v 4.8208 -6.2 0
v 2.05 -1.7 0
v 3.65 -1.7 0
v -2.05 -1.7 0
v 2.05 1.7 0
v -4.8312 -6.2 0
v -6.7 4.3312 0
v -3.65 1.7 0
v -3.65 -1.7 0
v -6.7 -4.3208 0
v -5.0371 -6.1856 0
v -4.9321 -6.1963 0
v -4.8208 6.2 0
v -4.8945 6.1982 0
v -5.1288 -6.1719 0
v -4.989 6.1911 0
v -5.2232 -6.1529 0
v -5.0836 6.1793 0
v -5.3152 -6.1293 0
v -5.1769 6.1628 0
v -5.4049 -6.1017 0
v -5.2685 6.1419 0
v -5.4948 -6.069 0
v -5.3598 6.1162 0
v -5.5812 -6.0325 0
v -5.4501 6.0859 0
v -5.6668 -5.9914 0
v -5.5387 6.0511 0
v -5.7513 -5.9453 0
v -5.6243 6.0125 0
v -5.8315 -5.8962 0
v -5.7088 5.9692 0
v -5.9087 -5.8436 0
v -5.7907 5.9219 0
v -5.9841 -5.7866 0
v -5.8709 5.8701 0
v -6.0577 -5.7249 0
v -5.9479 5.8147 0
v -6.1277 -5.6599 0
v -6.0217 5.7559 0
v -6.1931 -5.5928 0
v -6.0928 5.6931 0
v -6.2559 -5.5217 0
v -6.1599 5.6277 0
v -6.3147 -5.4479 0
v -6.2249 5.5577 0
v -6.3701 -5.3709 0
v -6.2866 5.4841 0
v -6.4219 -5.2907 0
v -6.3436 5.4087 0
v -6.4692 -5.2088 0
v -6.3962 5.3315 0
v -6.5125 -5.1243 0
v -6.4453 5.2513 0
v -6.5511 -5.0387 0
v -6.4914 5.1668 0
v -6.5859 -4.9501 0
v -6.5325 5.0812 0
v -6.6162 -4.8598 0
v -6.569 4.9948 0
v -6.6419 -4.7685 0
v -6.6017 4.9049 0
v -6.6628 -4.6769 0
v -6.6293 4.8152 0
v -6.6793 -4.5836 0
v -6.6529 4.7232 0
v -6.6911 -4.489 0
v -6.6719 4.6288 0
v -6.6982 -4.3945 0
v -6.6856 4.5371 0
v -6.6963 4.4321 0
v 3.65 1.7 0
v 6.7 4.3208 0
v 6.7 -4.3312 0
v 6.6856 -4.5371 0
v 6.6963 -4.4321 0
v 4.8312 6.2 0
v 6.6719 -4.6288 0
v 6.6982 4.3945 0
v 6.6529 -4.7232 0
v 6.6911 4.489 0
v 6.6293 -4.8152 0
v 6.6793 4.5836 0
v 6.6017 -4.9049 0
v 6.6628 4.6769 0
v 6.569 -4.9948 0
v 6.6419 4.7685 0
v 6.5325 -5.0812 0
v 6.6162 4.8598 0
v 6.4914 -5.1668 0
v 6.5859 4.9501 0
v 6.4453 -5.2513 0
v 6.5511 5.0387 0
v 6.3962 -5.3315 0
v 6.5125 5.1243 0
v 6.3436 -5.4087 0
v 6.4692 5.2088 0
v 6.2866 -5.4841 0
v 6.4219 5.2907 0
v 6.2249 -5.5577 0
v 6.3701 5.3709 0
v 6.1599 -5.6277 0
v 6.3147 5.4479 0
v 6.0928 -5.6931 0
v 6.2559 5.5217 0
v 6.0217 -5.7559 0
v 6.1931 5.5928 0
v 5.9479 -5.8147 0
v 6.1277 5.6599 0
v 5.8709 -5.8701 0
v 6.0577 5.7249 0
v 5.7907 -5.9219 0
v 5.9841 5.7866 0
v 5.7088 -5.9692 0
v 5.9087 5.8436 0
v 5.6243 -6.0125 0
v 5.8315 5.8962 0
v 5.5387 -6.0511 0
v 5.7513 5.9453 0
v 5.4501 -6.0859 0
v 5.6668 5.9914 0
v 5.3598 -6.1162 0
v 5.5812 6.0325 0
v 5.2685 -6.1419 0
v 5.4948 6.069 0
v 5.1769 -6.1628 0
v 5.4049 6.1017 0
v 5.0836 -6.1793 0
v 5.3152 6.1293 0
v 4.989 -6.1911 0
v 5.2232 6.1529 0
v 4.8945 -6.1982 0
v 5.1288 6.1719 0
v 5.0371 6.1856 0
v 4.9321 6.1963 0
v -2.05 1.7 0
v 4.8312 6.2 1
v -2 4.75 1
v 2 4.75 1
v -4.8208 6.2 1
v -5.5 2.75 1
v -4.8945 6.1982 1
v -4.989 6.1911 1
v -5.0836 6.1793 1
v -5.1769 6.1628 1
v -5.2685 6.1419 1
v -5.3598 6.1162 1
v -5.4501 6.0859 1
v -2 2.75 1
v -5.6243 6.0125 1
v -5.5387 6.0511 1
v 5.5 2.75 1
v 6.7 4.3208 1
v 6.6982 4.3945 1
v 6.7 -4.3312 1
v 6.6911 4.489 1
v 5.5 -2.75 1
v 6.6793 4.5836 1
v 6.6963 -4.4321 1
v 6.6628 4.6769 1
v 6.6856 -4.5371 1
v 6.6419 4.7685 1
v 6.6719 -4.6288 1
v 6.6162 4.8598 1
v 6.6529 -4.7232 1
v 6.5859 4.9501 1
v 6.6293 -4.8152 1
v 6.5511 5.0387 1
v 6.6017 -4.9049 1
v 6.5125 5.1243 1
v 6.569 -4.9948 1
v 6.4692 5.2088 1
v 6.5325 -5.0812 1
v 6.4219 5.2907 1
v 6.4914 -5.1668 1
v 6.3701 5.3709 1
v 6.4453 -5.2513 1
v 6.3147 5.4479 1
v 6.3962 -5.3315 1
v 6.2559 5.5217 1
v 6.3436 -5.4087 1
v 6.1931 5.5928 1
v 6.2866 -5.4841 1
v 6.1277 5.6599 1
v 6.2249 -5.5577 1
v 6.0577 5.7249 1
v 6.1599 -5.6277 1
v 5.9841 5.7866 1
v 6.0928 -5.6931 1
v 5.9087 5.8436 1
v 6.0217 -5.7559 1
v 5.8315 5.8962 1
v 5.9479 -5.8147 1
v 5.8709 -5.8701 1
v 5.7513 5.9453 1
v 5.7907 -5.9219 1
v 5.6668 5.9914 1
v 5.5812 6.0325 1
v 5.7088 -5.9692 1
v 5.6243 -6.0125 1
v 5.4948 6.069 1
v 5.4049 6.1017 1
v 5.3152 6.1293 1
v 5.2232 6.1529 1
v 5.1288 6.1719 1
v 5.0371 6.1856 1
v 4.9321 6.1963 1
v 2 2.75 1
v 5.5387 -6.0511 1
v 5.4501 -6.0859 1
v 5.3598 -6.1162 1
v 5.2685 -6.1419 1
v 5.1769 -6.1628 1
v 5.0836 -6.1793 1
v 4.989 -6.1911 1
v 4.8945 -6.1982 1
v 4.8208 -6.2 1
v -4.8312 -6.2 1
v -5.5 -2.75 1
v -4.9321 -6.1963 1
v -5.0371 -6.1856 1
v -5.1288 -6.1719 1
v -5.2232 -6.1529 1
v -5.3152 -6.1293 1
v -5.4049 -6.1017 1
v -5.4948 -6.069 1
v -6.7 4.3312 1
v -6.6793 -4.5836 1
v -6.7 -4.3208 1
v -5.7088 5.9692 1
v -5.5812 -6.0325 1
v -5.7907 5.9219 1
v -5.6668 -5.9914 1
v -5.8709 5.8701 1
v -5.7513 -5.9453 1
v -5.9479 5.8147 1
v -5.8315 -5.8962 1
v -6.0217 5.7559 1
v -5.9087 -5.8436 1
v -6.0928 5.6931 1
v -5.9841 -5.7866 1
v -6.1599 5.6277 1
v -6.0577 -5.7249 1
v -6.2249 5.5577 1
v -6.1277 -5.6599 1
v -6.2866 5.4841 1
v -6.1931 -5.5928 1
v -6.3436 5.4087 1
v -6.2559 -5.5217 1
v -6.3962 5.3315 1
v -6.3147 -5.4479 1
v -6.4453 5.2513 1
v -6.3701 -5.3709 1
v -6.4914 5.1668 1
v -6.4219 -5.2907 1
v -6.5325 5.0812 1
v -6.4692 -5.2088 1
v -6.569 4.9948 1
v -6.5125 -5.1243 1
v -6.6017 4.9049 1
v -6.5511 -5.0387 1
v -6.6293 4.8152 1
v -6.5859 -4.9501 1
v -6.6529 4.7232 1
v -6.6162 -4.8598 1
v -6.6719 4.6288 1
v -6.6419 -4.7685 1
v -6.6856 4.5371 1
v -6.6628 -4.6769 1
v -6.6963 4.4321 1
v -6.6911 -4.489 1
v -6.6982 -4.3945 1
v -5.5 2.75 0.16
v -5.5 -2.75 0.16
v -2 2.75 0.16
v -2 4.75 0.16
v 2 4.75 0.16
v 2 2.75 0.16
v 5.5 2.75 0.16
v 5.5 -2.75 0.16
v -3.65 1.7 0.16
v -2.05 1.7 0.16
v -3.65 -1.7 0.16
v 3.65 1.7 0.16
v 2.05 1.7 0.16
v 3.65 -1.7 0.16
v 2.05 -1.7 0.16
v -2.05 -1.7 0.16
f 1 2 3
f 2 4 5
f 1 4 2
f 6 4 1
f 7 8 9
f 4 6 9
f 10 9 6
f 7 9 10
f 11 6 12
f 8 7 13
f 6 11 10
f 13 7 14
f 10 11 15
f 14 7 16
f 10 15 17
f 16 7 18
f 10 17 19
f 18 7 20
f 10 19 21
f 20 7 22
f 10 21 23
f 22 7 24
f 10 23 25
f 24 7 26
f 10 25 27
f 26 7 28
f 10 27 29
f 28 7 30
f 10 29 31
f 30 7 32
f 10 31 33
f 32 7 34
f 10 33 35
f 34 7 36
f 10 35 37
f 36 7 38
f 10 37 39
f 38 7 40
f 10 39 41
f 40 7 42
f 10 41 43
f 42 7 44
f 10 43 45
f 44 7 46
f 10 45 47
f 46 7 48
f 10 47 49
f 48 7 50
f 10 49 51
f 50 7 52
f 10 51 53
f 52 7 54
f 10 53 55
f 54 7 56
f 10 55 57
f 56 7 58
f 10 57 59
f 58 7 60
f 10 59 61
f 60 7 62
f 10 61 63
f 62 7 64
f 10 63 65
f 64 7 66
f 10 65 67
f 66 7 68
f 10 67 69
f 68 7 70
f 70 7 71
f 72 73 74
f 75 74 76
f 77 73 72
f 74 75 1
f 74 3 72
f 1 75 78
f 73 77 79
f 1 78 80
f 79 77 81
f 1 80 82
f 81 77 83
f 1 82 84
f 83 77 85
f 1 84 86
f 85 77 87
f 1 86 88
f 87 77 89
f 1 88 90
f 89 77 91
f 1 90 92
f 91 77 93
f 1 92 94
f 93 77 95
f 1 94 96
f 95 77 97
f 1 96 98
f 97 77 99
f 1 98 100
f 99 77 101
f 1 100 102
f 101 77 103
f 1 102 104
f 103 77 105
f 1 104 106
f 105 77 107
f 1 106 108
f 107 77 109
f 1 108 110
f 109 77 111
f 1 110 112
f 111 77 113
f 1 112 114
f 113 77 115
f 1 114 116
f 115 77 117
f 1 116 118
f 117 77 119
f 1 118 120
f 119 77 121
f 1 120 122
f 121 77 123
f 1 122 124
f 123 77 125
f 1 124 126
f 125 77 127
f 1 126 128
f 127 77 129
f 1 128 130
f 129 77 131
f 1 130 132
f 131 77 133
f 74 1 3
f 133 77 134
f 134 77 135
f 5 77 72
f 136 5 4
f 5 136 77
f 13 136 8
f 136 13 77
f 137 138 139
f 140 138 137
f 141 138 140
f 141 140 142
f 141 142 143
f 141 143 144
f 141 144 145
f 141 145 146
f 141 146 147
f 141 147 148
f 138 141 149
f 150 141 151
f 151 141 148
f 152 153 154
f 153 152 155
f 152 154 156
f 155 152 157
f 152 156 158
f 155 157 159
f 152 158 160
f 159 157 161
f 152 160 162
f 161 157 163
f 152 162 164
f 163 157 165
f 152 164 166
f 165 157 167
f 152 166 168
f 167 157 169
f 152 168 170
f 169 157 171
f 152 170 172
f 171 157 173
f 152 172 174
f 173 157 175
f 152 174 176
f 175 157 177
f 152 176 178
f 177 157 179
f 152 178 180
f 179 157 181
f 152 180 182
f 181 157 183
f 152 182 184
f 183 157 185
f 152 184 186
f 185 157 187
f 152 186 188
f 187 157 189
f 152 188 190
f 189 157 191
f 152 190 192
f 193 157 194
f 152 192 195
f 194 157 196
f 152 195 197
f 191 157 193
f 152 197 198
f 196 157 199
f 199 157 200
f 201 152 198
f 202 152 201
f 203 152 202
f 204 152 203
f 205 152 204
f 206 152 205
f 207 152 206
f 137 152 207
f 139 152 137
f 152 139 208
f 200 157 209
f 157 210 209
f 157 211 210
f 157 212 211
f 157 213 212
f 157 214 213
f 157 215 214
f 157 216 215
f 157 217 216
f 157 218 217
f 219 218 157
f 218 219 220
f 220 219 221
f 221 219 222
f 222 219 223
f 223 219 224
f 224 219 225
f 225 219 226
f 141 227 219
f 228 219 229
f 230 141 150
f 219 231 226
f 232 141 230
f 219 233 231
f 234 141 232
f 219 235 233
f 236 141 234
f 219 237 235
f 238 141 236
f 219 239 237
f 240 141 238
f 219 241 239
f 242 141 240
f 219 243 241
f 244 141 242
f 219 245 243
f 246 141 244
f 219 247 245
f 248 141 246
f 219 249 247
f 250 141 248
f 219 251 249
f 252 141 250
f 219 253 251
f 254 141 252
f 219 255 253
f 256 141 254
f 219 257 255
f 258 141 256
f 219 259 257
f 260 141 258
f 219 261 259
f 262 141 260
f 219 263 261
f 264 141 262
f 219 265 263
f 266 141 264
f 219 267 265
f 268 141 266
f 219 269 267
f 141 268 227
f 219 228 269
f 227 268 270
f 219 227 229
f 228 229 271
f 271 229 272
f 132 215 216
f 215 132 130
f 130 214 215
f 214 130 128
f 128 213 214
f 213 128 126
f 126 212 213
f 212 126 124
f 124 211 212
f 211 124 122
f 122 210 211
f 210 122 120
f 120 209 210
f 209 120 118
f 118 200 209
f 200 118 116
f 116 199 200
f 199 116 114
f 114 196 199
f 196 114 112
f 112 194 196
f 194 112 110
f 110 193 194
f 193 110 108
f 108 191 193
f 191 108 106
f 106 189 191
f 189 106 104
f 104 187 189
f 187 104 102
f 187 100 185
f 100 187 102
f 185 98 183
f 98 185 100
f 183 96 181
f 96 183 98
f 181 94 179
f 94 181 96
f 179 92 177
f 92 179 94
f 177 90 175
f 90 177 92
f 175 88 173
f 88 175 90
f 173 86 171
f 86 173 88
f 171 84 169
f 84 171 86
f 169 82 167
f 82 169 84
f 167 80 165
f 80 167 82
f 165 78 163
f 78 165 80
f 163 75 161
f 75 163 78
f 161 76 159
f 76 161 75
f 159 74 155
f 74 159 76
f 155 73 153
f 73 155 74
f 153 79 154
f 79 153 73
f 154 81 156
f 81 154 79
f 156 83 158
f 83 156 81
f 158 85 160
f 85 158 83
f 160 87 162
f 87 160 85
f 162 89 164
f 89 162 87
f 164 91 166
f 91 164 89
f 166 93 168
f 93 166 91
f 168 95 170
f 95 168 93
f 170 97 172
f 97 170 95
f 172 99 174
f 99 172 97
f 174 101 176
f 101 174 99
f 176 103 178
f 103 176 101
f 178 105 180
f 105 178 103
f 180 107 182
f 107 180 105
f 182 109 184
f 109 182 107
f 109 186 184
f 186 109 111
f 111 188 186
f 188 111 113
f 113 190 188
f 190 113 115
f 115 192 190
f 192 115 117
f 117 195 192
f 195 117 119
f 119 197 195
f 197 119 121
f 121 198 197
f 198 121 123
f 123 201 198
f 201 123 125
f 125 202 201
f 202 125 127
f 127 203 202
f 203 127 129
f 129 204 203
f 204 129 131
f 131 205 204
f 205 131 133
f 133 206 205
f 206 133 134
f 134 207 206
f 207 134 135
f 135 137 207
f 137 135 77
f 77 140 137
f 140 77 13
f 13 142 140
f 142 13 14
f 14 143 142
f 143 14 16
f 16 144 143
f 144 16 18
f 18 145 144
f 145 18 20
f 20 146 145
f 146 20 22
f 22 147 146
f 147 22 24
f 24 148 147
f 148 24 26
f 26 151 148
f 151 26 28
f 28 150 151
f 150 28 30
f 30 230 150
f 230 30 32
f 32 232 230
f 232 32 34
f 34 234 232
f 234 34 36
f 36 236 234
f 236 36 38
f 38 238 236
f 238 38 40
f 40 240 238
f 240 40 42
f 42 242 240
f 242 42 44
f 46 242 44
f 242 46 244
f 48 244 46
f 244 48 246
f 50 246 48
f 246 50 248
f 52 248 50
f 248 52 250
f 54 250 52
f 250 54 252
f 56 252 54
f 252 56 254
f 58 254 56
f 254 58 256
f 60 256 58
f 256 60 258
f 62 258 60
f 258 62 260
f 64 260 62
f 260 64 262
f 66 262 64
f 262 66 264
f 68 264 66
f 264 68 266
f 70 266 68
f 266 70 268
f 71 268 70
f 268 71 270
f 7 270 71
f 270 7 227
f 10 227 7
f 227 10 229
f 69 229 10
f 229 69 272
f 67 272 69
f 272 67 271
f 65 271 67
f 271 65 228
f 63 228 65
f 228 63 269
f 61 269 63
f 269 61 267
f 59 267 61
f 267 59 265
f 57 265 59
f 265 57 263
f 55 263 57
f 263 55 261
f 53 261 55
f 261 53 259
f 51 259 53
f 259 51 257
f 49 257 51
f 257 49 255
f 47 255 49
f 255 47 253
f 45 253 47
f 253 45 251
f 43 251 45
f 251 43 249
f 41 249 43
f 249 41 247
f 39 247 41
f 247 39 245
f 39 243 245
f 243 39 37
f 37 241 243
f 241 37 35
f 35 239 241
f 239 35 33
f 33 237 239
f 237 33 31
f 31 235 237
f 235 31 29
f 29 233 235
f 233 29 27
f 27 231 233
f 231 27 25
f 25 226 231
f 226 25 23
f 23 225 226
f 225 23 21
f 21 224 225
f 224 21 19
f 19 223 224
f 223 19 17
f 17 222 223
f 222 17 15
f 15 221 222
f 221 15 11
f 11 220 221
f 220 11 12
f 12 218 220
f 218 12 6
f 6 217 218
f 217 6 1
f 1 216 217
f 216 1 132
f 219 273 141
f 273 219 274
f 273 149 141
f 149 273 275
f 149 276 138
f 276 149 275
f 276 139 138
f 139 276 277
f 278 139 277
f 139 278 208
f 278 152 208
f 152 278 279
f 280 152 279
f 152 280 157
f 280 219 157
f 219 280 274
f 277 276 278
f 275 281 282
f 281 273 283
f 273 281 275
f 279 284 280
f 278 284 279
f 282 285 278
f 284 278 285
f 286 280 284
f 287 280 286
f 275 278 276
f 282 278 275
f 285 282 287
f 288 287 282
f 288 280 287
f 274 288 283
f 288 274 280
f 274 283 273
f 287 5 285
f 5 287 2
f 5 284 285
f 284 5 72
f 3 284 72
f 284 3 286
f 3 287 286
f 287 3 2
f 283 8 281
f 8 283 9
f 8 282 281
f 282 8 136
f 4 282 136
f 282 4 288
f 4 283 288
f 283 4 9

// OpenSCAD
// Parameters

// Dynamic quality (0.12mm) should be used

interface_height = 0.16;

gasket_height = 1;
gasket_thickness = 1.7;

$fa = 0.01;
$fs = 0.01;

module rounding2d(r) {
    offset(r = r) offset(delta = -r) children(0);
}
 
linear_extrude(height = gasket_height) {
    difference() {
        offset(delta = gasket_thickness) {
            union() {
                rounding2d(0.2)
                    square([10,9], center = true);
            }
        }
        union() {
            square([11,5.5], center = true);
            translate([0,(5.5/2)+(2/2),0])
                square([4, 2+0.00001], center = true);
        }
   }
}

linear_extrude(height = interface_height) {
    difference(){
        rounding2d(0.2)
            square([11,10], center = true);
        union(){
            translate([2.85,0,0])
                square([1.6,3.4], center = true);
            translate([-2.85,0,0])
                square([1.6,3.4], center = true);
        }
    }
}
